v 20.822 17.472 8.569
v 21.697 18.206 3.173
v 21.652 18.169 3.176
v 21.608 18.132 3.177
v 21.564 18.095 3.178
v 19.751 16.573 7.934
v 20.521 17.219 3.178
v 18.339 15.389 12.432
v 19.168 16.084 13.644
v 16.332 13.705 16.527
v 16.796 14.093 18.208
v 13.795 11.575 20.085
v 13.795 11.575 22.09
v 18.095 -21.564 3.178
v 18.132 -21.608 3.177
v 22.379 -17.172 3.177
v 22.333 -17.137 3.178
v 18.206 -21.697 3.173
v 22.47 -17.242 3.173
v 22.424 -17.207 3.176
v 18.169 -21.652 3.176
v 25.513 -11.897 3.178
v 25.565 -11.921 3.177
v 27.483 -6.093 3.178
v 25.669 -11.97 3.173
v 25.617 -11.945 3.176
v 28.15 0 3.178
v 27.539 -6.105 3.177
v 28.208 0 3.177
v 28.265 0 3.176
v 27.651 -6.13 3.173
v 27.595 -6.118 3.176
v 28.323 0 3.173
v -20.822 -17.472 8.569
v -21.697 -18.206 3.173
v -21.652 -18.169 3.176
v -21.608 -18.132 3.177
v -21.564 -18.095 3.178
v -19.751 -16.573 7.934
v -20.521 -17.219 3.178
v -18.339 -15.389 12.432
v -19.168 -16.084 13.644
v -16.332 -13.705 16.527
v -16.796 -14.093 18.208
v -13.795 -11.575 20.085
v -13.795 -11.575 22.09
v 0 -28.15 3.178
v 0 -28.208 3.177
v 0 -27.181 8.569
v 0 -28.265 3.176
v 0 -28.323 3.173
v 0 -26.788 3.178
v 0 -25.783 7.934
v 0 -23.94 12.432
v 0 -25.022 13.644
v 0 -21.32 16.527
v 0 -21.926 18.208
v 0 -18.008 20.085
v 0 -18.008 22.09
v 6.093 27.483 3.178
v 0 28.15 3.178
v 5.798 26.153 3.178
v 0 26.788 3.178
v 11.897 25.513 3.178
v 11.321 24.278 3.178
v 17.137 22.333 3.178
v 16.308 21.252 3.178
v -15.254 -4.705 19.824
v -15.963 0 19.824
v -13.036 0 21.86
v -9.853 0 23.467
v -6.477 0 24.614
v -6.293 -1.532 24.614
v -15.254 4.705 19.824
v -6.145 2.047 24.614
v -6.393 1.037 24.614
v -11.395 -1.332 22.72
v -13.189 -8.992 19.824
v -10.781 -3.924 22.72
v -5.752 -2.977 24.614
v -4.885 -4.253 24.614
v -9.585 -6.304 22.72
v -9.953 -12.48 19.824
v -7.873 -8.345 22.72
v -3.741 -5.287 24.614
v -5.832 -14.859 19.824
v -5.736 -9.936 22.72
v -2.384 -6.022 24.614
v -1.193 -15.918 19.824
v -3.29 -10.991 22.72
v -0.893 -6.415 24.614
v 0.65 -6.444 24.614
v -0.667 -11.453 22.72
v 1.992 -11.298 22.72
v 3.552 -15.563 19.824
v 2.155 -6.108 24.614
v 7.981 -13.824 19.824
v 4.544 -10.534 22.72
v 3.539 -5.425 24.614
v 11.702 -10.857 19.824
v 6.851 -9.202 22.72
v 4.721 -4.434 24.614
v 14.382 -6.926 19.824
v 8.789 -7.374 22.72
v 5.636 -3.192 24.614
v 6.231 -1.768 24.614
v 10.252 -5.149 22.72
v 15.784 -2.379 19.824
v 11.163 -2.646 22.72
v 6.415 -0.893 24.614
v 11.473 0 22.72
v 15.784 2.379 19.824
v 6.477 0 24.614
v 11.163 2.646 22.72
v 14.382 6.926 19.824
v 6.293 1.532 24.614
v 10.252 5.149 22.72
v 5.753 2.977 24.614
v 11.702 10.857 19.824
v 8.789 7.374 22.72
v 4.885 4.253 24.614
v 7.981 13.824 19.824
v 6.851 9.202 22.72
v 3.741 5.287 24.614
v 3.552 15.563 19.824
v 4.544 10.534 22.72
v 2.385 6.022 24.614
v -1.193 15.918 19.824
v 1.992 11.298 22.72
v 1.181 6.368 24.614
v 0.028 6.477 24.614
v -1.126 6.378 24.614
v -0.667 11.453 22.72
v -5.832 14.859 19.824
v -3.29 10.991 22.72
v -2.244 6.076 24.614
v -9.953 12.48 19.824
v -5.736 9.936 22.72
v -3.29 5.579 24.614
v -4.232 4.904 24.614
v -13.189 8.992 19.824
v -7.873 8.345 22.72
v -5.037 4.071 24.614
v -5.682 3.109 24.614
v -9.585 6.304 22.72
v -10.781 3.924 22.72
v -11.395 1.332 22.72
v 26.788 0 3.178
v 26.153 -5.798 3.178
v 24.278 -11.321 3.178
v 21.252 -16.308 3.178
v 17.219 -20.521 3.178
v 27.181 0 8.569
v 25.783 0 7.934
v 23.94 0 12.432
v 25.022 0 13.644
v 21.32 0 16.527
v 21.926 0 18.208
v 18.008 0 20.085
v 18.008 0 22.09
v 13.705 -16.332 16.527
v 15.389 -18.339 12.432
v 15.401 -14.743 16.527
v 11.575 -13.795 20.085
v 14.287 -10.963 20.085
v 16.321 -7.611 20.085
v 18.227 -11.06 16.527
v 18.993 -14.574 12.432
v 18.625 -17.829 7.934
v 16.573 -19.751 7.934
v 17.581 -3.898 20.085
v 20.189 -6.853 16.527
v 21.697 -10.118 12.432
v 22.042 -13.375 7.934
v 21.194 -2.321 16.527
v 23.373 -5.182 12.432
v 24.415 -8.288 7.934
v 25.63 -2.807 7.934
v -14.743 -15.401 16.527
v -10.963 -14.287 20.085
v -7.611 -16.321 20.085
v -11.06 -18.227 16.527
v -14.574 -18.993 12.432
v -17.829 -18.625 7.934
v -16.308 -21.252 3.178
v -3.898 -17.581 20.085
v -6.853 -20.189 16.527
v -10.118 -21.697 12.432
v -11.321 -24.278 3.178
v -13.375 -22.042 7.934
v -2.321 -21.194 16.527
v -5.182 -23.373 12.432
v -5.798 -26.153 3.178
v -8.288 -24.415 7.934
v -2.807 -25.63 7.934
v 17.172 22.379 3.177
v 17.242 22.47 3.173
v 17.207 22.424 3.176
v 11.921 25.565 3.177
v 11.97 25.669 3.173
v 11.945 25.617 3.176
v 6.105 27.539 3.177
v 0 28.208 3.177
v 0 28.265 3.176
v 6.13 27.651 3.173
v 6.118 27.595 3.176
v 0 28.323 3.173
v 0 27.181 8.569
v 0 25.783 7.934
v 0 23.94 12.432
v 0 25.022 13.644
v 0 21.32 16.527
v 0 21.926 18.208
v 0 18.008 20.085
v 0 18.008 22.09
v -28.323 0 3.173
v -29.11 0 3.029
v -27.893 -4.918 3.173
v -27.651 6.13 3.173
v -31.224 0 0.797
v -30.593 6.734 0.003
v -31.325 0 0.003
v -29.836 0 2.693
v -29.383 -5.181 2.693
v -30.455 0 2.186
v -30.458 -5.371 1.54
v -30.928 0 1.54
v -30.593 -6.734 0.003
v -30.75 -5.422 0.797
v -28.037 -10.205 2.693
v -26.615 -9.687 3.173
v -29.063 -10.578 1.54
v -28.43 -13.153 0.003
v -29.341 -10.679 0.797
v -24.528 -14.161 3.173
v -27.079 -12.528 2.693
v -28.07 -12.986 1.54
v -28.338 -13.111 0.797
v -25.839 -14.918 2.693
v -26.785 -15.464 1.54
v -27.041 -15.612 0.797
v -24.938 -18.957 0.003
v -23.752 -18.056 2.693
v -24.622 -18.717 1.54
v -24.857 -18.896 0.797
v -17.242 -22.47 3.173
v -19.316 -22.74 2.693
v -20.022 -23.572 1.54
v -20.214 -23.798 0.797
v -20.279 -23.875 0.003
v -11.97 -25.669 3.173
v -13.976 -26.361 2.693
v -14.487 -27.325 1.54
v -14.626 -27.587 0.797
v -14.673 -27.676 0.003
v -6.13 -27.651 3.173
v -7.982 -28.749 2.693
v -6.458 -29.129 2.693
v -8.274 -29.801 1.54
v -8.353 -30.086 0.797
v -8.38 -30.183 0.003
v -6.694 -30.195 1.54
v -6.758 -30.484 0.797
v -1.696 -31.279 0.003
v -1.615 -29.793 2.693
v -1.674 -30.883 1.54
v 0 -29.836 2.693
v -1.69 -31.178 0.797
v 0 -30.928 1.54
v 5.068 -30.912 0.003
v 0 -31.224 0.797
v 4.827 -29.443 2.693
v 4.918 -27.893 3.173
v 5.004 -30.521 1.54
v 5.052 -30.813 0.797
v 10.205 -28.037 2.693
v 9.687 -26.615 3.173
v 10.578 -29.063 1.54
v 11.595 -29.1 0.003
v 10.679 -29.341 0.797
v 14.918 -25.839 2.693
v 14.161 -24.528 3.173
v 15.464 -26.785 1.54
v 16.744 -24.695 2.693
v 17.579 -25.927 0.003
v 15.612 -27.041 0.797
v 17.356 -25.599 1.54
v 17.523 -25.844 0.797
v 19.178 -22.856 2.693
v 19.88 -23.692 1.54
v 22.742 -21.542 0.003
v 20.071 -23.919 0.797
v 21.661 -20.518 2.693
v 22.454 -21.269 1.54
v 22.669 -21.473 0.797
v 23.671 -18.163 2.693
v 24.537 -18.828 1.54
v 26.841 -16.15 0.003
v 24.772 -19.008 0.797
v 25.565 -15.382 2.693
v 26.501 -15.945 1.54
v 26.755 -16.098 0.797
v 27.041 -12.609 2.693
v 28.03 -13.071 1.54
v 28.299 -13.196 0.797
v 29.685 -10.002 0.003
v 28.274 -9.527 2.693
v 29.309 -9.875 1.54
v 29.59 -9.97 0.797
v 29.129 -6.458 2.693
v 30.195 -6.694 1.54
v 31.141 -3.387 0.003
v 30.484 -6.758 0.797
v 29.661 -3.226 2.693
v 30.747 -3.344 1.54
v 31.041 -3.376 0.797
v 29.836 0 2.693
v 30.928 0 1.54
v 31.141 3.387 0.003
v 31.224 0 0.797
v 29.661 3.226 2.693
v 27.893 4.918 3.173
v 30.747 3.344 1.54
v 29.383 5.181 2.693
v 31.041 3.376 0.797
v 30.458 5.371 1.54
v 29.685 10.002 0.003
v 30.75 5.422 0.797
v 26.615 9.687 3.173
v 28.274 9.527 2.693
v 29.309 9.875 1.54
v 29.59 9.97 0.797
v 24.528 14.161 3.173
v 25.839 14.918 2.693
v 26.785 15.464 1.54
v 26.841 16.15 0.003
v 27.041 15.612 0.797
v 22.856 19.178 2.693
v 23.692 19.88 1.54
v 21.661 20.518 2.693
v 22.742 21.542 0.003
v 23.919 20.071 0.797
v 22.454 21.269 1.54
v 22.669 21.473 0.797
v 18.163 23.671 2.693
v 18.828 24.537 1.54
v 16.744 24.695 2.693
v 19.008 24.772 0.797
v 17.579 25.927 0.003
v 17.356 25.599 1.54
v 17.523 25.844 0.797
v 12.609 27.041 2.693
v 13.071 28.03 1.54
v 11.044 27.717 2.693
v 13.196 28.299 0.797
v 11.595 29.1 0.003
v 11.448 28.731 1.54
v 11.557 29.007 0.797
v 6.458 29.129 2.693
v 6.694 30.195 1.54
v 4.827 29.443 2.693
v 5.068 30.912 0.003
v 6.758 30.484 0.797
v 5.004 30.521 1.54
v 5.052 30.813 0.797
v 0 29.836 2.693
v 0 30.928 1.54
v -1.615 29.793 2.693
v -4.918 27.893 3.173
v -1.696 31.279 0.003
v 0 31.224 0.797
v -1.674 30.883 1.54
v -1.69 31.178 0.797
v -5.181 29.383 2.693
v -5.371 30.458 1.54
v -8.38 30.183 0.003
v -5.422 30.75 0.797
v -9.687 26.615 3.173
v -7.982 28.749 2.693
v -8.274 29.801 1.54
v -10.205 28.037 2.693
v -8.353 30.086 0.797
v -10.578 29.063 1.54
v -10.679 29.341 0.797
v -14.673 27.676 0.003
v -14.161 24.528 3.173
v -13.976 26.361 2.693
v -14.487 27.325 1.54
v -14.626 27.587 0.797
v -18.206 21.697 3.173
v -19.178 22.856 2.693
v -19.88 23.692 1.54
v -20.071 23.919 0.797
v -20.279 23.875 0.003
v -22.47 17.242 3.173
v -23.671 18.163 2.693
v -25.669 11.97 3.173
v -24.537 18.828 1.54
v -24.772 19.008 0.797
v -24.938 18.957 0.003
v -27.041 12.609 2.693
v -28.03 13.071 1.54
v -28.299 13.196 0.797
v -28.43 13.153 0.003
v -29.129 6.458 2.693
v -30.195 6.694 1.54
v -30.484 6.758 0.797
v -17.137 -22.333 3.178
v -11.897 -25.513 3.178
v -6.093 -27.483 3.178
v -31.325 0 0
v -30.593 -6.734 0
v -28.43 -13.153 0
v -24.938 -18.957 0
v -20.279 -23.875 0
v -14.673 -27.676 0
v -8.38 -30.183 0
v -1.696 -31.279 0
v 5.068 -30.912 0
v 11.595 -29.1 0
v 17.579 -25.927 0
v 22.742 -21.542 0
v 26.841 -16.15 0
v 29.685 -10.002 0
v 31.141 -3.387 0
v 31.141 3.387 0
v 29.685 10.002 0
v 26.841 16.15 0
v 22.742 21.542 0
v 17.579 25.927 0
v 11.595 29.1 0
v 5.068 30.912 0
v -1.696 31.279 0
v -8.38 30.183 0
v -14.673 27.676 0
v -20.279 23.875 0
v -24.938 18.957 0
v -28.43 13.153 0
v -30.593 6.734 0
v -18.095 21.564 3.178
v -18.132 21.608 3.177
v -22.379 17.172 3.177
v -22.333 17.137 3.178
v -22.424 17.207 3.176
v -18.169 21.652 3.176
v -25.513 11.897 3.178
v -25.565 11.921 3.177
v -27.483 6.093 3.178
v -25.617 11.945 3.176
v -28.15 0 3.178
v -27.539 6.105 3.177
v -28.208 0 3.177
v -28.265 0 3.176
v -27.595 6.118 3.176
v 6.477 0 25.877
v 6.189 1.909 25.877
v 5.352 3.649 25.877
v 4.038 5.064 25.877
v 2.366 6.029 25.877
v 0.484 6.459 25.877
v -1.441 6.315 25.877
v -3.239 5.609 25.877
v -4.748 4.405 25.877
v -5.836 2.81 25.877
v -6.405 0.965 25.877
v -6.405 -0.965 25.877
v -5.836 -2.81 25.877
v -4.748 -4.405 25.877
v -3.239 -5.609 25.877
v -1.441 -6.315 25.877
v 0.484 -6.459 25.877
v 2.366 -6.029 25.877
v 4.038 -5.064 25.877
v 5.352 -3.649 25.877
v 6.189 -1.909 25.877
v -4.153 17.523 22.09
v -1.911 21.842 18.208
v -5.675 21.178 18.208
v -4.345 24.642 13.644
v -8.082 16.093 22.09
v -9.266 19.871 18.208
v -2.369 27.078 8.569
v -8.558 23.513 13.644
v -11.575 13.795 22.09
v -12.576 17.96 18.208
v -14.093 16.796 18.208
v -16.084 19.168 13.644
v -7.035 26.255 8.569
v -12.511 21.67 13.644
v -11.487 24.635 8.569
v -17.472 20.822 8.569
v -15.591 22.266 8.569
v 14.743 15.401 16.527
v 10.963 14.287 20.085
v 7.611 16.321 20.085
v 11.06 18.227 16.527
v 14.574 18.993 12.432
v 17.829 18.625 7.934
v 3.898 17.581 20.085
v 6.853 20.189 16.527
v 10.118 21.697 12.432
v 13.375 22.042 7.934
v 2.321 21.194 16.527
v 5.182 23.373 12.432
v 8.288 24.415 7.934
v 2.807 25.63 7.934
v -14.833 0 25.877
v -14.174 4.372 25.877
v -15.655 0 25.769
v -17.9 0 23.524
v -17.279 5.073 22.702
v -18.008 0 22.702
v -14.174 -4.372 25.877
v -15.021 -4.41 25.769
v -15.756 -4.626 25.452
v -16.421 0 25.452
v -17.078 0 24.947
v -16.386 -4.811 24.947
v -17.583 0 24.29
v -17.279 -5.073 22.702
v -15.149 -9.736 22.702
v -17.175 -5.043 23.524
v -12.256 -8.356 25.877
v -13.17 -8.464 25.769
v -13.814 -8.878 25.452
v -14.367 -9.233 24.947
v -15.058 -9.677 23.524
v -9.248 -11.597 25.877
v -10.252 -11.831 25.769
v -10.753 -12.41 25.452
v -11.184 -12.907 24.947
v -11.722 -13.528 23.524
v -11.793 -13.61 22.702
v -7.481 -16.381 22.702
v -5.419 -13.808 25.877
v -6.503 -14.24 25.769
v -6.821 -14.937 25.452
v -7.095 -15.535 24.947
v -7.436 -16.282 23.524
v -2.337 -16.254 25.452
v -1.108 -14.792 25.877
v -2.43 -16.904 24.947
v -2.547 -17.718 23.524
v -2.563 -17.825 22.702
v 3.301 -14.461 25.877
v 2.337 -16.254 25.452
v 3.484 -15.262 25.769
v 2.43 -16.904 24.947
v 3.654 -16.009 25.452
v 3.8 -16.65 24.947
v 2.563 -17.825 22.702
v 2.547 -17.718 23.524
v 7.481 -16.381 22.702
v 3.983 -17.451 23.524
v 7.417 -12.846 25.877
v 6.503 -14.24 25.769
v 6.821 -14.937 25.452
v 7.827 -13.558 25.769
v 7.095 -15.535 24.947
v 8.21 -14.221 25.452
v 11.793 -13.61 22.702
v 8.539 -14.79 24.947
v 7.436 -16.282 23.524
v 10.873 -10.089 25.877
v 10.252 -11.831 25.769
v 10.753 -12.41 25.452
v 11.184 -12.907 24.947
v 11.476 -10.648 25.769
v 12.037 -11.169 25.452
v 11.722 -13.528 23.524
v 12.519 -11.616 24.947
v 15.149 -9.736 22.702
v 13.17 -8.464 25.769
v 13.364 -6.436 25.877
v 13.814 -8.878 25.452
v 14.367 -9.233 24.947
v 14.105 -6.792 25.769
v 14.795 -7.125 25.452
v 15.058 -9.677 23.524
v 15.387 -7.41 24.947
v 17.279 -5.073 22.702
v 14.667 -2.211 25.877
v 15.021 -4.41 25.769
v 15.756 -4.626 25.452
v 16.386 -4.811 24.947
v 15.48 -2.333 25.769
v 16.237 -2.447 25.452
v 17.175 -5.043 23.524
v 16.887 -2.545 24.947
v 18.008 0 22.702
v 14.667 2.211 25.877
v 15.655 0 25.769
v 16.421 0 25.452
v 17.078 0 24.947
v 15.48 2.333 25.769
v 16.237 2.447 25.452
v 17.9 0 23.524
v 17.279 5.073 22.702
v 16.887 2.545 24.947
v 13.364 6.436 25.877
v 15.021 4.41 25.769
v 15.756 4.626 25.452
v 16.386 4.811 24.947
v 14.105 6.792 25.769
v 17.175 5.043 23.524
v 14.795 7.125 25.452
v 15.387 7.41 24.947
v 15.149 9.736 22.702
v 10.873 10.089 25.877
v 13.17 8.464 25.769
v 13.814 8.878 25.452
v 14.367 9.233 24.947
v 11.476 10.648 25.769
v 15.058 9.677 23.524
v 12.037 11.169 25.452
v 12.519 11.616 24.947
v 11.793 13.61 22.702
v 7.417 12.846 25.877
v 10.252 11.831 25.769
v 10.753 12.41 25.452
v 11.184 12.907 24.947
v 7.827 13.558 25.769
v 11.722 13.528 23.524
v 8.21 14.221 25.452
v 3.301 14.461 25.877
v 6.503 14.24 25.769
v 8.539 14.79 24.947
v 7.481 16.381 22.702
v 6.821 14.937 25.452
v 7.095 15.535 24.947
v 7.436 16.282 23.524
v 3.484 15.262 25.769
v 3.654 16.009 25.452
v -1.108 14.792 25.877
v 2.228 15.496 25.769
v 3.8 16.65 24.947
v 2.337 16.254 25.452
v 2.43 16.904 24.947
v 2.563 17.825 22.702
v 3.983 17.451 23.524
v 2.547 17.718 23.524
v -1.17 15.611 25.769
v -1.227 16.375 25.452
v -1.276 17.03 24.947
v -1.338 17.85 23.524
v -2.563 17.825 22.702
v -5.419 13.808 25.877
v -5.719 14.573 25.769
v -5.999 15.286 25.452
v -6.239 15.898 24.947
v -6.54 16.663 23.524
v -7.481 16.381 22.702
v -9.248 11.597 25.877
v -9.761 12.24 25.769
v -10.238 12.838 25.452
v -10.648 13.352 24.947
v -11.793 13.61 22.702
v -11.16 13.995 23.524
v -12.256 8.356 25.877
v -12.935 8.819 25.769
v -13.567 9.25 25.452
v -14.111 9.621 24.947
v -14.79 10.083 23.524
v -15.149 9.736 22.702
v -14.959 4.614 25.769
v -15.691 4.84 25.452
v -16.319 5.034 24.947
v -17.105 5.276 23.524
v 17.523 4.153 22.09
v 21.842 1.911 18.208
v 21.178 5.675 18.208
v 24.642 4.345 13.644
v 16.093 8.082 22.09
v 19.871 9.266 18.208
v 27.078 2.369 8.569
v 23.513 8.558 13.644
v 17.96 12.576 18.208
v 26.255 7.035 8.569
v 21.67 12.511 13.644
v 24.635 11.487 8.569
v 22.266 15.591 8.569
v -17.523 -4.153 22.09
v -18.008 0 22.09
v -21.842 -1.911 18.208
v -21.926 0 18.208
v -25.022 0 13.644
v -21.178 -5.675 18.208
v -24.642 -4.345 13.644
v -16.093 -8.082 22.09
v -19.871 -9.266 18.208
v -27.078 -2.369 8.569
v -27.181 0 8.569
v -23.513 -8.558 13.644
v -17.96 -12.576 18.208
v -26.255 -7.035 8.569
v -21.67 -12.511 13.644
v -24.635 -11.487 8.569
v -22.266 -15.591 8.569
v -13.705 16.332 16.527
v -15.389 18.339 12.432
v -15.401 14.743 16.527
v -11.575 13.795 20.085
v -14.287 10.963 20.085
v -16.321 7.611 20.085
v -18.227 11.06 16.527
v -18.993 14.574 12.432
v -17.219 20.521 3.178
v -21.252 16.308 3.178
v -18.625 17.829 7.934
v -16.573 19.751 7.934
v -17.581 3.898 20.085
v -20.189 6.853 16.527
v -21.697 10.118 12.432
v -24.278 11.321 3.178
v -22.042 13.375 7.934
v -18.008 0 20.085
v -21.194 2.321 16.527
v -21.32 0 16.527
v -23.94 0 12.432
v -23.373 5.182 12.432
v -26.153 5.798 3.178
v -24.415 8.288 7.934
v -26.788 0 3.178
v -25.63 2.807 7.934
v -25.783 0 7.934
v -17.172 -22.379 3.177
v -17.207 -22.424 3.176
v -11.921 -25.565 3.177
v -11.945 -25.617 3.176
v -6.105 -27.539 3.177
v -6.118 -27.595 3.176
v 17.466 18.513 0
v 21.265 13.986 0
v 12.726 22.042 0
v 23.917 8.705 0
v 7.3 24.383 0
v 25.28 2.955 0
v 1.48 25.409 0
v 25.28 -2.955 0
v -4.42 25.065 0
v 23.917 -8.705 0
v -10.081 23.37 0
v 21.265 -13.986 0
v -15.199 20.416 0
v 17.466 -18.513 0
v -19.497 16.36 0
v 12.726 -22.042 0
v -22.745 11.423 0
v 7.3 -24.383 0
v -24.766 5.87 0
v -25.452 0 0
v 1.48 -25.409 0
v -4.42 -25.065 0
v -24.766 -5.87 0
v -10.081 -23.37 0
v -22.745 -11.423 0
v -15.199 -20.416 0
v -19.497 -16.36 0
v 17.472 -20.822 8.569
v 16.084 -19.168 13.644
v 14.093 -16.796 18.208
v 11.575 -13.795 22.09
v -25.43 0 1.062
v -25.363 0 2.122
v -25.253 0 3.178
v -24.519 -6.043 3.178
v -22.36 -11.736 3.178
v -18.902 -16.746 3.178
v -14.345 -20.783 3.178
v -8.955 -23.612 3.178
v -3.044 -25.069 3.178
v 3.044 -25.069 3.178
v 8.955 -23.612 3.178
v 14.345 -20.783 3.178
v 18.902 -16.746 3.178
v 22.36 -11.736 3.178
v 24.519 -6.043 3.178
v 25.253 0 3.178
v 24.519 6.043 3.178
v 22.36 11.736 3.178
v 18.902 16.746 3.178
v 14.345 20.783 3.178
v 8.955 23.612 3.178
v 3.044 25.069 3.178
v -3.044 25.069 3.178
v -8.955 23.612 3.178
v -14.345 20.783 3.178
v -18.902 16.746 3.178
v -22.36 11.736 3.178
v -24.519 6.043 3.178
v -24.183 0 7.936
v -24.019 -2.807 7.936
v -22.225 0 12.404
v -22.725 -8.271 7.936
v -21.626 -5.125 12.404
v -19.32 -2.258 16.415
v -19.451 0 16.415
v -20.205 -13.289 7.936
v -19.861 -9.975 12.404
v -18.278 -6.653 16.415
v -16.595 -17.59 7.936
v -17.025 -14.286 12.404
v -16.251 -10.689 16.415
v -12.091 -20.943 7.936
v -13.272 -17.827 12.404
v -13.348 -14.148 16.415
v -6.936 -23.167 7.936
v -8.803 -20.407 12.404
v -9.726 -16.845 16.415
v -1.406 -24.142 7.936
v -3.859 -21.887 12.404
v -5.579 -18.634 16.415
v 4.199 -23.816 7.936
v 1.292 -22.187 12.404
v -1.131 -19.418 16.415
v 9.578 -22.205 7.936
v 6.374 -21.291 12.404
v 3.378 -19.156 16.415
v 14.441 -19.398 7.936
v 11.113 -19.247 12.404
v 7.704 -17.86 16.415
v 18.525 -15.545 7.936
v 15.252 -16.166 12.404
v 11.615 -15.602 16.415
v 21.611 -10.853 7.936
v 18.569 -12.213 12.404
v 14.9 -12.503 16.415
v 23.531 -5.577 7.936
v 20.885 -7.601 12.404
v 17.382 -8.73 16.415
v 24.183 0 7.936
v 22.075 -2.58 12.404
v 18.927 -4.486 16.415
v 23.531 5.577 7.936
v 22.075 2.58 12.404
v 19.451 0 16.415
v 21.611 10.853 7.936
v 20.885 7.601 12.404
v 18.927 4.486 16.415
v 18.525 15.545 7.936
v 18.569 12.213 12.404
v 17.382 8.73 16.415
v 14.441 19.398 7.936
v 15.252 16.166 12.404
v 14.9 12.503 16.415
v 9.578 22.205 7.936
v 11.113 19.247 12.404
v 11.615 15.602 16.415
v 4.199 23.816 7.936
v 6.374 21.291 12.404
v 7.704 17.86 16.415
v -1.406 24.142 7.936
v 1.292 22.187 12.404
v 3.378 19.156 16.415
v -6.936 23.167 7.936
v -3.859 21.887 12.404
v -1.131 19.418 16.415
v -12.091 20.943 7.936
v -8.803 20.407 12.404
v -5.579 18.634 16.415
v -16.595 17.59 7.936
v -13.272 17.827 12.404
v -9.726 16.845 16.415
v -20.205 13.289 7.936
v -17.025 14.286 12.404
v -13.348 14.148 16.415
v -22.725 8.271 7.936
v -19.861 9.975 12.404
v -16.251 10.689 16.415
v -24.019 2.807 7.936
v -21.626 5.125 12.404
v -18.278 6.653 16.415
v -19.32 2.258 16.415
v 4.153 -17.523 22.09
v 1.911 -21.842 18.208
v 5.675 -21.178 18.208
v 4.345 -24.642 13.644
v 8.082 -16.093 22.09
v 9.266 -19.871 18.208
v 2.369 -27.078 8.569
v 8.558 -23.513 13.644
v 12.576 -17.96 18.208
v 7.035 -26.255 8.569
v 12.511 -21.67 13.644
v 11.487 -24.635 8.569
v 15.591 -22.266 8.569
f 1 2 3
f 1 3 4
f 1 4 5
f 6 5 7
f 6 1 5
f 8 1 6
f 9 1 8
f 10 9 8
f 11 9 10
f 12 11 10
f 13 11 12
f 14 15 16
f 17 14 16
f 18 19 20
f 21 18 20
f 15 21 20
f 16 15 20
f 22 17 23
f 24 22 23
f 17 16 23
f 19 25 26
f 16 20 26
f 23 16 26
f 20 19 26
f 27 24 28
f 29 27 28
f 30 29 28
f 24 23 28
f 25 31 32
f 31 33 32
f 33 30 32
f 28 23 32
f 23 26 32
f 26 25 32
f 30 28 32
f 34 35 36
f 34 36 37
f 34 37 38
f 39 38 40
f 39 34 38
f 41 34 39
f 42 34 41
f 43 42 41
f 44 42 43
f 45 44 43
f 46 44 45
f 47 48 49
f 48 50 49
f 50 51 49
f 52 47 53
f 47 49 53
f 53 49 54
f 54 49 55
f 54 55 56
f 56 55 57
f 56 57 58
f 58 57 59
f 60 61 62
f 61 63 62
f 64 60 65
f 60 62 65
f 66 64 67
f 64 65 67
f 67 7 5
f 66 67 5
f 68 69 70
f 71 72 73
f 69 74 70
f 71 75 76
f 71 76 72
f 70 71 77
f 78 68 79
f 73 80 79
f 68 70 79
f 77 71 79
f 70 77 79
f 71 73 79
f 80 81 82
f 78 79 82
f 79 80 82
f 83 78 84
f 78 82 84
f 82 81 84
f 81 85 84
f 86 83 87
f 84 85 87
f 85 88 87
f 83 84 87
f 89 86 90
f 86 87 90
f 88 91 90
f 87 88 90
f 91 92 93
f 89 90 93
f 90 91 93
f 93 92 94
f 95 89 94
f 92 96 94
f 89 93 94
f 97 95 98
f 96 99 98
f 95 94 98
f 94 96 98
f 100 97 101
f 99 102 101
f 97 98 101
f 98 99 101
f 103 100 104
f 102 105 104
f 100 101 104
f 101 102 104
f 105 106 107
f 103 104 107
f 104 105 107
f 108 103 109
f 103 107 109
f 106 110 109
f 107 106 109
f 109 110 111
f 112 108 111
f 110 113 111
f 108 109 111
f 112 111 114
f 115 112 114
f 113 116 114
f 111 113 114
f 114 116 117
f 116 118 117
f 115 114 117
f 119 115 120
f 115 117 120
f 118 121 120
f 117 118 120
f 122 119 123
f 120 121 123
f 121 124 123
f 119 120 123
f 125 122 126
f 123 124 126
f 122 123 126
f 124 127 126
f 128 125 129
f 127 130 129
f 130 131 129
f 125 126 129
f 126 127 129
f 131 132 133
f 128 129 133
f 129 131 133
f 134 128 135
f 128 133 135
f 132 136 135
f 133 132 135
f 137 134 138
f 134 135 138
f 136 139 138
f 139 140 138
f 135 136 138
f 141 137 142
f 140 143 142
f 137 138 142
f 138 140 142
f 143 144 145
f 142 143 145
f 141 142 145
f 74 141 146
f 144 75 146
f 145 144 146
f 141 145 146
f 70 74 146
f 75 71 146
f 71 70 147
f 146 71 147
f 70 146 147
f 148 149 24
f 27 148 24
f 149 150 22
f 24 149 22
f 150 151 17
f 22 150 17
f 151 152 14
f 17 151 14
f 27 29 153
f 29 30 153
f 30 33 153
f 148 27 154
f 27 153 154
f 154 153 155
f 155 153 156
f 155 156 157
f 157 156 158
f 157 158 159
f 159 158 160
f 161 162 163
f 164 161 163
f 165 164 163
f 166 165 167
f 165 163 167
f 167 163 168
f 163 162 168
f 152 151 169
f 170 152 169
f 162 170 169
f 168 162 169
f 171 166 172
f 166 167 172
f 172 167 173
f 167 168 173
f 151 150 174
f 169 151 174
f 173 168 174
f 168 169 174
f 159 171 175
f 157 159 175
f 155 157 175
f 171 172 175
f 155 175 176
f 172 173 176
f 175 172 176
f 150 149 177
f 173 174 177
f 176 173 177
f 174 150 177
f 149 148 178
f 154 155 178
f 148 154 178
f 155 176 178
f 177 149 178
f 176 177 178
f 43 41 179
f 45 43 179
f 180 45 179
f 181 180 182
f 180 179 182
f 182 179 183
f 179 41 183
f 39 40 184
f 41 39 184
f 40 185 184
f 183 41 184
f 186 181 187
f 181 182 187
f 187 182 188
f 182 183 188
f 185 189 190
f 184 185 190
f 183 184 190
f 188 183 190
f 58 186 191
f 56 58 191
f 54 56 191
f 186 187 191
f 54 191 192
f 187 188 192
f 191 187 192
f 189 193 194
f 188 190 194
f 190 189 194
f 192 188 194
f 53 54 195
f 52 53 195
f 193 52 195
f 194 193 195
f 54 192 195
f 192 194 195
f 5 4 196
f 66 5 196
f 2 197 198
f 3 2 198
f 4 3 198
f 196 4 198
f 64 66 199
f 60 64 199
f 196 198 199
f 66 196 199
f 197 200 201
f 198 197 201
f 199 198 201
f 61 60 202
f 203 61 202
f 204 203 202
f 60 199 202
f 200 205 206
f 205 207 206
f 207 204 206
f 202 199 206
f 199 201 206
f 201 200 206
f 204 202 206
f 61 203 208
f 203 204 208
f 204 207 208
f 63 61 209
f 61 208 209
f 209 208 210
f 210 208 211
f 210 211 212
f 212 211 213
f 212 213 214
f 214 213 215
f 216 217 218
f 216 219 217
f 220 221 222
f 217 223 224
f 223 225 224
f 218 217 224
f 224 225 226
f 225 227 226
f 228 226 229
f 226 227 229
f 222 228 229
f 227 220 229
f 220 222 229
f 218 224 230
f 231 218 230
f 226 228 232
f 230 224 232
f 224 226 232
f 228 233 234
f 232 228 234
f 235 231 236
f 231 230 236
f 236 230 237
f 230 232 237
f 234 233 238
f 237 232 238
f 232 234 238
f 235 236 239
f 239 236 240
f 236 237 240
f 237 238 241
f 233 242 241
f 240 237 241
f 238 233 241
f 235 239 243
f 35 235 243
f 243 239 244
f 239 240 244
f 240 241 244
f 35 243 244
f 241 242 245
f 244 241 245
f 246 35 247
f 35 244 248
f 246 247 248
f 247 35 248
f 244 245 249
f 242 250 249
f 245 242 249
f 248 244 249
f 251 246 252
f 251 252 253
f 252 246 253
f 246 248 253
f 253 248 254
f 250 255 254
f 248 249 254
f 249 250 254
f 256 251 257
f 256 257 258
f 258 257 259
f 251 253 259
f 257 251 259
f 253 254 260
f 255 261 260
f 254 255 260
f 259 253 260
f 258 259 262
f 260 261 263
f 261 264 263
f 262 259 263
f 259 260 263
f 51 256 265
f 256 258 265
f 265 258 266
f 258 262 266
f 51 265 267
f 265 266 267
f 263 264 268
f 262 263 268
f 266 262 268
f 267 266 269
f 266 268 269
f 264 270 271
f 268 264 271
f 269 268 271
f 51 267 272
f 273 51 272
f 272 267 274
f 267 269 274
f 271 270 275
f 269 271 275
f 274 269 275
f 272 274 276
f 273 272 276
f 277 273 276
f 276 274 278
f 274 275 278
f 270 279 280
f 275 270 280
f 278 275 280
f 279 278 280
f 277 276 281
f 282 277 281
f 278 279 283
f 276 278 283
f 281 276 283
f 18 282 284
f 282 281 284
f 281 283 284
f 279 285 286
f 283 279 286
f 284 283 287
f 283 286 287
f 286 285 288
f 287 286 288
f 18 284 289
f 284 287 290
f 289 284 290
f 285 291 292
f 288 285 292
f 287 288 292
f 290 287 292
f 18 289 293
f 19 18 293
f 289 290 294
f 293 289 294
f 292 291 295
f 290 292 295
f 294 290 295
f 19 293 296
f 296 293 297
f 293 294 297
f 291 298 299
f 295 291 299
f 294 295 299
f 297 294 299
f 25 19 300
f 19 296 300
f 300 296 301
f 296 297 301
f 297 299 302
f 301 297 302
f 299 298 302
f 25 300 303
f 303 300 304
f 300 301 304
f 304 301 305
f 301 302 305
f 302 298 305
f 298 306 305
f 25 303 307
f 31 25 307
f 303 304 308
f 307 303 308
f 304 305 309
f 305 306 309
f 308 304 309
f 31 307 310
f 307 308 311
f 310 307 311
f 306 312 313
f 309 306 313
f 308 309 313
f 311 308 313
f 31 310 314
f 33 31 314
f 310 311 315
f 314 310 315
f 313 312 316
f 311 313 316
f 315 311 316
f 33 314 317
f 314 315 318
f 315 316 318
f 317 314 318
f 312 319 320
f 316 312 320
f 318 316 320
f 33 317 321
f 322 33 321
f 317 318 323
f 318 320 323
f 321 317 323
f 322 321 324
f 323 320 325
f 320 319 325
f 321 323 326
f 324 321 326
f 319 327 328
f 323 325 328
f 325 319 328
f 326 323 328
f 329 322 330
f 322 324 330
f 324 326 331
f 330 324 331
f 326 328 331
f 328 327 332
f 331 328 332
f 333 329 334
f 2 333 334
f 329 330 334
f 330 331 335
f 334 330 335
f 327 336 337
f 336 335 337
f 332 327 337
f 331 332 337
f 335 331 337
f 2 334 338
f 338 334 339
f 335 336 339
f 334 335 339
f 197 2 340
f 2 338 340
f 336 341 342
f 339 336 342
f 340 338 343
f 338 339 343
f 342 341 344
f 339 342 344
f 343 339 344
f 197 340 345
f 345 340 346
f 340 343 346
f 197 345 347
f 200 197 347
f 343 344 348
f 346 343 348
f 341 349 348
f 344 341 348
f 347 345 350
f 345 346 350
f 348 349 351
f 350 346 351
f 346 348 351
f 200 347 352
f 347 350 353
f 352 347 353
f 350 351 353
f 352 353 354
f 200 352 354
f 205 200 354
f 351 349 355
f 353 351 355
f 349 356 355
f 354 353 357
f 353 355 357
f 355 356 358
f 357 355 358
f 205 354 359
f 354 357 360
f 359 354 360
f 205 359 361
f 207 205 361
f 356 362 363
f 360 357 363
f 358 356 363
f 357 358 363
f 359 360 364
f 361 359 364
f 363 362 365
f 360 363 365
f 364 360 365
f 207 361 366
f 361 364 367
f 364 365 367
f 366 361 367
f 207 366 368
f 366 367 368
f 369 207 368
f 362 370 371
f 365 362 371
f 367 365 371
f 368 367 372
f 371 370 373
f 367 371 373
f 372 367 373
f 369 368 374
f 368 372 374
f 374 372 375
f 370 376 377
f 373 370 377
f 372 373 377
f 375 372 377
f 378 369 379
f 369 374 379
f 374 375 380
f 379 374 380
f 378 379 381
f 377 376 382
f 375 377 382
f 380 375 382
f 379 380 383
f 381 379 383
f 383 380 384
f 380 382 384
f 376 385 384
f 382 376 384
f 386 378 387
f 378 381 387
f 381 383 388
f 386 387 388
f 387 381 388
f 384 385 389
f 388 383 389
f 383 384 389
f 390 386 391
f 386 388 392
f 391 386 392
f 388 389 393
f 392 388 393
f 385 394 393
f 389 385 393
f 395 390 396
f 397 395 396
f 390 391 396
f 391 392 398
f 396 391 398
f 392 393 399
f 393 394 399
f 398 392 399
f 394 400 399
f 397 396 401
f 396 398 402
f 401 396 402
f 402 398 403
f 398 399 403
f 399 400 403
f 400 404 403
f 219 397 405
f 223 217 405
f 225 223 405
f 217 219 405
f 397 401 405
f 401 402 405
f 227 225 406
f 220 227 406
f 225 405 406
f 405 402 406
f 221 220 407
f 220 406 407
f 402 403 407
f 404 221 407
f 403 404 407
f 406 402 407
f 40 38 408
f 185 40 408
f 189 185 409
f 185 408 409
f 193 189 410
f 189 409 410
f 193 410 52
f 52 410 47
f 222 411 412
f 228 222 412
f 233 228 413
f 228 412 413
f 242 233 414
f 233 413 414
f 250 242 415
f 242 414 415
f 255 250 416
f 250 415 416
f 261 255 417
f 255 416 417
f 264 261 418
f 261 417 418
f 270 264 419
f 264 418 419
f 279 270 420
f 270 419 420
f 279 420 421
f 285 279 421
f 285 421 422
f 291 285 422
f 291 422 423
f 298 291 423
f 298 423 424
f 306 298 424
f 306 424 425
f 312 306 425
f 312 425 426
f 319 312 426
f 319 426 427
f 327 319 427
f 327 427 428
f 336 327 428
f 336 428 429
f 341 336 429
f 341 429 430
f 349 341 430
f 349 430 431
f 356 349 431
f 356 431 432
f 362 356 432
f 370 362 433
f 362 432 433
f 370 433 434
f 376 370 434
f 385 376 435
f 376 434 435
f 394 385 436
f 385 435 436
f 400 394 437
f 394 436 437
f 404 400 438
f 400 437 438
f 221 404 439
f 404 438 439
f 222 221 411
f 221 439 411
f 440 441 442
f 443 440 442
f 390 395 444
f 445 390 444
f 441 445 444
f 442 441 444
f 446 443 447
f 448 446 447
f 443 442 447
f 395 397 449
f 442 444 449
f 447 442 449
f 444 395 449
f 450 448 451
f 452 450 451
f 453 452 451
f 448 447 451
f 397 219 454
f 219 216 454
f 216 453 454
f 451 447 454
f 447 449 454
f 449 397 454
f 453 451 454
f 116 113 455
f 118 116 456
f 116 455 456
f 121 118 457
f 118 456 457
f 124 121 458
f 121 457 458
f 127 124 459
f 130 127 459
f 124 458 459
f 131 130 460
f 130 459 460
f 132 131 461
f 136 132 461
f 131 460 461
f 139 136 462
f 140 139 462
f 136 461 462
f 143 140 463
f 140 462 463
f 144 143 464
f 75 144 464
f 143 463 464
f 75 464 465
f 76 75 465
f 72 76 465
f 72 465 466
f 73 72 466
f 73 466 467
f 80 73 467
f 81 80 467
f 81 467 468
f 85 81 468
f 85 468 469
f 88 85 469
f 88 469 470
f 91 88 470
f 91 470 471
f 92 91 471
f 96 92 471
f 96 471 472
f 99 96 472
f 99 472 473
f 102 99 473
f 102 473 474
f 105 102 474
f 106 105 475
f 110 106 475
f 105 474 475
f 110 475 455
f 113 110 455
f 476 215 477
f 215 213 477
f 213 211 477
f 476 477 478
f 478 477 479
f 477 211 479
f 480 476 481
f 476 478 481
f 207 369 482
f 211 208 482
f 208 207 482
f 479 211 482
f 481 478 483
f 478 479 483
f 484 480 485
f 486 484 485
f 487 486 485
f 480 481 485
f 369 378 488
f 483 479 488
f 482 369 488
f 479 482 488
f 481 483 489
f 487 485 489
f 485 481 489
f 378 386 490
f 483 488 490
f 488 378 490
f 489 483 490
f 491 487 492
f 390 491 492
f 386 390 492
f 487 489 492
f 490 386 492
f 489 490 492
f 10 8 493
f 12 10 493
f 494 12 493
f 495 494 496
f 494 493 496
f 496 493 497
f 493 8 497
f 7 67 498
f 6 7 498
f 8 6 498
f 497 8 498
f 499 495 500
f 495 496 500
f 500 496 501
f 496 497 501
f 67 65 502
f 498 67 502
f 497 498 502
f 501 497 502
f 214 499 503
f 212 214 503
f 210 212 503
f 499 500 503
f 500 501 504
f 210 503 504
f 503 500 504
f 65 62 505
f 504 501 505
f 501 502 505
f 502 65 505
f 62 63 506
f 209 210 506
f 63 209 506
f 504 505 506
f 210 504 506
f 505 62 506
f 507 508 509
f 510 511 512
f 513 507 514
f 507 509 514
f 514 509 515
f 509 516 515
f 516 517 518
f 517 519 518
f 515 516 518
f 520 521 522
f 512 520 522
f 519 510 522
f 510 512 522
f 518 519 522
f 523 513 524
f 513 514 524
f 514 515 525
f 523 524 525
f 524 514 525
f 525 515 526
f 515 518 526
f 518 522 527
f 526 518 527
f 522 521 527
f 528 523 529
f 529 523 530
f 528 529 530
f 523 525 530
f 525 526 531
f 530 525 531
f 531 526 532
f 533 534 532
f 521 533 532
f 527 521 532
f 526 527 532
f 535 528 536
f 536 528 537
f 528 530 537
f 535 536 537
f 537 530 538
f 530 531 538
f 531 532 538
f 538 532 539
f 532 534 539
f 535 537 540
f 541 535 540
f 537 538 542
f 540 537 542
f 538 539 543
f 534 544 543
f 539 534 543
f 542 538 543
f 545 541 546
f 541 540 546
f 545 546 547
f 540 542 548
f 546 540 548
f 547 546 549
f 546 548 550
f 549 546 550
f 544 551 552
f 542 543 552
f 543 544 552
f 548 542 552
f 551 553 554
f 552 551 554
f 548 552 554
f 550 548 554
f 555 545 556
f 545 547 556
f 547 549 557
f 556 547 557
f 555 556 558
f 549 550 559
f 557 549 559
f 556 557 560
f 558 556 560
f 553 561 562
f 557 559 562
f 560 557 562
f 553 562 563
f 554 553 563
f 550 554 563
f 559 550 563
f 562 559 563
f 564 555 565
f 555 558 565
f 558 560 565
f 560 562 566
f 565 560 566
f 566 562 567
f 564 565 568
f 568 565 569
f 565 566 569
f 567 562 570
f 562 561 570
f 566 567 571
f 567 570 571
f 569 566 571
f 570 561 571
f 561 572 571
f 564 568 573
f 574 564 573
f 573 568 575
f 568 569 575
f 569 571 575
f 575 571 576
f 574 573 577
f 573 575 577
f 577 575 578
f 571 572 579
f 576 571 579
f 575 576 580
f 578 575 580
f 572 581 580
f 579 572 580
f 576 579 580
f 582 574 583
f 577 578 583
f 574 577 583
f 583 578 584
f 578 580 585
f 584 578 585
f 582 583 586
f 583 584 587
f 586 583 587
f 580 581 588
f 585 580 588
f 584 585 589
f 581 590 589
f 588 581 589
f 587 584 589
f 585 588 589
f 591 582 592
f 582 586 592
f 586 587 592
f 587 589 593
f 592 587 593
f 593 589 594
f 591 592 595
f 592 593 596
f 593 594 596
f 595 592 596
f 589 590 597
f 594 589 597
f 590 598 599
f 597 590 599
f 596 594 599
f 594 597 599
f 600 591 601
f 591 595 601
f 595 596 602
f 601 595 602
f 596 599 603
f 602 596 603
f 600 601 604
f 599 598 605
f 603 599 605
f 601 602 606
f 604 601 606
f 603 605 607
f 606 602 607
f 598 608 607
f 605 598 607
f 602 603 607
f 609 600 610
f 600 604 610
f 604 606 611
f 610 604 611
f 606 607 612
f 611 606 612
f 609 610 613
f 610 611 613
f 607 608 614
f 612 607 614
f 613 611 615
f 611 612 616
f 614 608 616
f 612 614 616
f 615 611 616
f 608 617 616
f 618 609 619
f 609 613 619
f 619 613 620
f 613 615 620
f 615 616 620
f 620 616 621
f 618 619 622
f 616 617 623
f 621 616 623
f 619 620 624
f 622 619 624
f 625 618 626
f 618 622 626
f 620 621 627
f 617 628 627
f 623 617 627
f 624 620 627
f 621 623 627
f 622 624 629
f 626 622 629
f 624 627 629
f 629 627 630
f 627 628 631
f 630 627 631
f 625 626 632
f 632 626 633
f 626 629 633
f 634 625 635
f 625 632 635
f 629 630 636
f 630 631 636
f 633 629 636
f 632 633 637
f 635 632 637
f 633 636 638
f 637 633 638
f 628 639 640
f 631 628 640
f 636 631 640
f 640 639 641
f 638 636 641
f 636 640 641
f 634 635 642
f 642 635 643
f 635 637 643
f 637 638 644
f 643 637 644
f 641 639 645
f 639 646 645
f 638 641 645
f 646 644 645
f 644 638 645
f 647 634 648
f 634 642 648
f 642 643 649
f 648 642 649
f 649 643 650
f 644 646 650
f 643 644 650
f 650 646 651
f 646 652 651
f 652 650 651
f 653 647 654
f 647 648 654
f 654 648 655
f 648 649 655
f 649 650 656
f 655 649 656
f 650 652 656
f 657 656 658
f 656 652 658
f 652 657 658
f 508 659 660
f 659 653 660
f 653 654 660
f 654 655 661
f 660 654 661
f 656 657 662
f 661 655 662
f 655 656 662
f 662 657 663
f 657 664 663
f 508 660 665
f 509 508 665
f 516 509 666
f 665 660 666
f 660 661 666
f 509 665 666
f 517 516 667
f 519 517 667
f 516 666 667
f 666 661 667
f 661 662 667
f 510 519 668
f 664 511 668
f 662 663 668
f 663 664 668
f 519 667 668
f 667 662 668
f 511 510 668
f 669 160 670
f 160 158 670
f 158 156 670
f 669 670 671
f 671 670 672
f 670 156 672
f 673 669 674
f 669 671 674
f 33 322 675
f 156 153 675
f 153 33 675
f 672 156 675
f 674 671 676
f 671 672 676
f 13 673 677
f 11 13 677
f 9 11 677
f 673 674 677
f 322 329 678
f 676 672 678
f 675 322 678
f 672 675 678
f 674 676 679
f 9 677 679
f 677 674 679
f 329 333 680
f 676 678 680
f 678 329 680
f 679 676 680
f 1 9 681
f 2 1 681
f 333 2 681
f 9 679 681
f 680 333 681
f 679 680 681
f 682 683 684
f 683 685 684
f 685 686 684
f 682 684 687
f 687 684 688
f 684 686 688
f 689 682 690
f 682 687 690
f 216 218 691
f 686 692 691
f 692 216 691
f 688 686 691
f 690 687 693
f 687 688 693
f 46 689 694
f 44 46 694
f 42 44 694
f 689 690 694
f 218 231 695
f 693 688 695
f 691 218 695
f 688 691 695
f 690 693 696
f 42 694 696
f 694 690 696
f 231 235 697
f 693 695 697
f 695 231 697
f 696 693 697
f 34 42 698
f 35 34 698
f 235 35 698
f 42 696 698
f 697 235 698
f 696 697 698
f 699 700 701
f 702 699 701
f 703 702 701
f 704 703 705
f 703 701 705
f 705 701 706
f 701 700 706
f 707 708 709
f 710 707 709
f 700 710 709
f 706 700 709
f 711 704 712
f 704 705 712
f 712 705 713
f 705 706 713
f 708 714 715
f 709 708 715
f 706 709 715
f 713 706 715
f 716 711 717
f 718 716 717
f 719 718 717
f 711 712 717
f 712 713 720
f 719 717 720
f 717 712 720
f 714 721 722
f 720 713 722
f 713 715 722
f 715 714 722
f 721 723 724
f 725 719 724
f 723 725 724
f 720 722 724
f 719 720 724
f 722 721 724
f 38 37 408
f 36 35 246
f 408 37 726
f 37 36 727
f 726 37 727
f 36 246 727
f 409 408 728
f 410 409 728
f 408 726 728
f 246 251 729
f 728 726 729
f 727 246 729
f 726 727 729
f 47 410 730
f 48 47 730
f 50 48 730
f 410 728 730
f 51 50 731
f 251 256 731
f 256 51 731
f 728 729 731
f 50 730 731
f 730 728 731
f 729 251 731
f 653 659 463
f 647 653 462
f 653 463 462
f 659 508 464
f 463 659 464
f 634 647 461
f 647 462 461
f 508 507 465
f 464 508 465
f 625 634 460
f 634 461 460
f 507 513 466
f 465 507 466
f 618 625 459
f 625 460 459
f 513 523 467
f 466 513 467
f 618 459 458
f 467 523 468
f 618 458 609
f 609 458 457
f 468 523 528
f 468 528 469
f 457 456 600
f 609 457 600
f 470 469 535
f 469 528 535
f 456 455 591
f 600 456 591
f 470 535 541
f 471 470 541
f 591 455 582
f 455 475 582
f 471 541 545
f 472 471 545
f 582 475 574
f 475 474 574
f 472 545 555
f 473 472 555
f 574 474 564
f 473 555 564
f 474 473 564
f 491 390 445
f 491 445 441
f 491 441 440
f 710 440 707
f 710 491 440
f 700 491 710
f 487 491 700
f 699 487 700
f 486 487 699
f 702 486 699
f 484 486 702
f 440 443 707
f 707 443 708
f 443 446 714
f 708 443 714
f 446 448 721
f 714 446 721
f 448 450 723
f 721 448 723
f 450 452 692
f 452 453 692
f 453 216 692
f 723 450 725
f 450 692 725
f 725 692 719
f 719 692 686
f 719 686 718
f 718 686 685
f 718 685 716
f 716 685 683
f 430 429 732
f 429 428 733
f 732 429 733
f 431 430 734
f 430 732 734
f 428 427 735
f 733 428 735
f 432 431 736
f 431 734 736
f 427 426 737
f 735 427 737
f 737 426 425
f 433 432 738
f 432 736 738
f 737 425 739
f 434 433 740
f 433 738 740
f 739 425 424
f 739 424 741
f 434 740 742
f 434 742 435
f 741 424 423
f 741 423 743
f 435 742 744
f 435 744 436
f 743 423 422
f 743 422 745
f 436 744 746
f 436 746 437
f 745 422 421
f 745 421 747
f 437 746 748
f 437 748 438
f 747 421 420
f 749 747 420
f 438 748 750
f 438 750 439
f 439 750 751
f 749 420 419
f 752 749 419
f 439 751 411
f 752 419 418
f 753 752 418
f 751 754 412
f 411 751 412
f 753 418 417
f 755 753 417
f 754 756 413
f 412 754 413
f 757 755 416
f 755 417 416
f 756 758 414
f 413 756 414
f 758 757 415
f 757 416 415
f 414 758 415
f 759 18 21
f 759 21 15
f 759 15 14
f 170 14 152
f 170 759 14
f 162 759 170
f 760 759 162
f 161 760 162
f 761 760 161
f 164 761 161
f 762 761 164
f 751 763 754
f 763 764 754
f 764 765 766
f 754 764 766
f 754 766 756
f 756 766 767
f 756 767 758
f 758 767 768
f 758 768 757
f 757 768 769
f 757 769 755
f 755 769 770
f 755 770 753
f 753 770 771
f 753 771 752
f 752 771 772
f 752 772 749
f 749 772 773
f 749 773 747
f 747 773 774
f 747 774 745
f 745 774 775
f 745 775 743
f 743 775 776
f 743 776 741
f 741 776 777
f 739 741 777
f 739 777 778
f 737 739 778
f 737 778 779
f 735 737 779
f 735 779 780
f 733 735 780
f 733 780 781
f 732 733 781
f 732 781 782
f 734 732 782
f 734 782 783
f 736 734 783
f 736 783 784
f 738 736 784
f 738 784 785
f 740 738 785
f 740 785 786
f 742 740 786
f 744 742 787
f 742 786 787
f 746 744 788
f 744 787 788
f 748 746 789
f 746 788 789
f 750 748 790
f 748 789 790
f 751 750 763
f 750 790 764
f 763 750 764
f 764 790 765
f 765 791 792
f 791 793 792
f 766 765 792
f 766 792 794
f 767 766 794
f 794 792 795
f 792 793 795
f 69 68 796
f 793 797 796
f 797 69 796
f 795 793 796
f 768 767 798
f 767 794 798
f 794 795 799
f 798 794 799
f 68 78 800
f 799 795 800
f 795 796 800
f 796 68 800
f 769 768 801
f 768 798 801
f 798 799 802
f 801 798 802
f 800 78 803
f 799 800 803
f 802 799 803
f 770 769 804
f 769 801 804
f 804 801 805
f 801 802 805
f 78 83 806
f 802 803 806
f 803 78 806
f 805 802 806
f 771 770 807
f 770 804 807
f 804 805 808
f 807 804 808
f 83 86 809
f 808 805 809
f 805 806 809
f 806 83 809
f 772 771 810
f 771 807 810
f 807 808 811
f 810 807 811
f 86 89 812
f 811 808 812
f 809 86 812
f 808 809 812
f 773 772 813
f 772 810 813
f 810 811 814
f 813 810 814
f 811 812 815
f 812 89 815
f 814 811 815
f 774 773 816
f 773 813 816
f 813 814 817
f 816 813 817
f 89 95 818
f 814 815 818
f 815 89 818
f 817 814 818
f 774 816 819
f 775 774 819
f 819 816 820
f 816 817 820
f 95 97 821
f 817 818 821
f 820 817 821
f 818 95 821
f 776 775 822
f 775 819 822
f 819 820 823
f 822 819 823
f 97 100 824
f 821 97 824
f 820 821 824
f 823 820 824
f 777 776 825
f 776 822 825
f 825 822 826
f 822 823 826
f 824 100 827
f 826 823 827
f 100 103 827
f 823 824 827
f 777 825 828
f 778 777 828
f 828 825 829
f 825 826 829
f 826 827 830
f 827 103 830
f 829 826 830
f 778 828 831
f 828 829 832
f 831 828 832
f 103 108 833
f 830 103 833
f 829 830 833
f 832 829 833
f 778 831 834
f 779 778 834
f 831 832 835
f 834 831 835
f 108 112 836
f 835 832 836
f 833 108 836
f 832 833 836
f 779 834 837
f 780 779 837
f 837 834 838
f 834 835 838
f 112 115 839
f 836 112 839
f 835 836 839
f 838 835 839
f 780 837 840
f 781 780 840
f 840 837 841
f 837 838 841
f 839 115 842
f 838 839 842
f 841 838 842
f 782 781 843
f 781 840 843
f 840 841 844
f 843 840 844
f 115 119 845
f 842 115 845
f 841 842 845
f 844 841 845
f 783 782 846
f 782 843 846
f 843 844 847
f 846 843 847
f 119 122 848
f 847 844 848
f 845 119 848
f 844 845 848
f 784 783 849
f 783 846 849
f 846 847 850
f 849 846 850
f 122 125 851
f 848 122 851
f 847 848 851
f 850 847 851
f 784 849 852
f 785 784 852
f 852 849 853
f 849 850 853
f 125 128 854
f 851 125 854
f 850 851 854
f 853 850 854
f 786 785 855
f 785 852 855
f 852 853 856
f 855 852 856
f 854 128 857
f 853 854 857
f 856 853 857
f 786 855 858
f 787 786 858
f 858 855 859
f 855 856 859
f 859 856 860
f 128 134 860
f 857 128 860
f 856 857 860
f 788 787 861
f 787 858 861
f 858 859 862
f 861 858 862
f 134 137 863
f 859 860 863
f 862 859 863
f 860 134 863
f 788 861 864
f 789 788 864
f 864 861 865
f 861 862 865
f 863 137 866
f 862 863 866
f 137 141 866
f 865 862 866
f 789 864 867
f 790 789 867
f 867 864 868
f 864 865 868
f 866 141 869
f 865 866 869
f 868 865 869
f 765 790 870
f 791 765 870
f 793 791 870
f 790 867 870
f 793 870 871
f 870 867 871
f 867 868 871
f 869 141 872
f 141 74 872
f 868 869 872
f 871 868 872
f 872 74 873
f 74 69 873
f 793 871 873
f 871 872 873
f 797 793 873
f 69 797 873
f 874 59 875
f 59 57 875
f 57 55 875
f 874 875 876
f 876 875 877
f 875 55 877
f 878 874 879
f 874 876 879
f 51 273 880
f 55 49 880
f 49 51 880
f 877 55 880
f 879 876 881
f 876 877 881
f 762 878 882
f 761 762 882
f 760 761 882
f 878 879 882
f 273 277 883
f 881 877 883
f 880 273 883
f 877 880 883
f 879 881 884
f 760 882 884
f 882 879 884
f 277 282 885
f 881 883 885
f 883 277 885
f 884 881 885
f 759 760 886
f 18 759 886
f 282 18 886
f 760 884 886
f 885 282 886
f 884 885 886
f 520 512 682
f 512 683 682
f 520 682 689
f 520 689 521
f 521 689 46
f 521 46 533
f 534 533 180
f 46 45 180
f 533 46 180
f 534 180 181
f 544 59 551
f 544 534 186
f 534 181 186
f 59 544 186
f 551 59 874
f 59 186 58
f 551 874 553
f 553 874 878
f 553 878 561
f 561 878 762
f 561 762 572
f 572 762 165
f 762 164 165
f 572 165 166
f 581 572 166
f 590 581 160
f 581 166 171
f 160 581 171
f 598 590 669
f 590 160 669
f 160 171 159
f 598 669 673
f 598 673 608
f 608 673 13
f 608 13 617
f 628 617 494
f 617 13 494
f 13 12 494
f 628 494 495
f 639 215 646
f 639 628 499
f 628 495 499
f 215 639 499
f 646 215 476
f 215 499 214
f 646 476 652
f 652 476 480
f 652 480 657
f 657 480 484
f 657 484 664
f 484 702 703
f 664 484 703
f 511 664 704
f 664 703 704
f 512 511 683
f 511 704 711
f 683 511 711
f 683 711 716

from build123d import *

# Parameters (mm, degrees)
F2_ANGLE = 40
F3_COUNT = 4
F4_R     = 6.477
F5_DEPTH = 25.4


with BuildPart() as f1:
    # F0 (on Front) → F1 (revolve)
    with BuildSketch(Plane.XZ):
        with BuildLine():
            Line((0, 25.452), (0, 25.8772801608))
            Line((0, 25.8772801608), (-7.6204296126, 25.8772801608))
            ThreePointArc((-7.6204296126, 25.8772801608), (-13.1374862604, 23.5607943575), (-18.0081613362, 20.0850865393))
            Line((-18.0081613362, 20.0850865393), (-18.0081613362, 19.8241155595))
            Line((-18.0081613362, 19.8241155595), (-15.9627299133, 19.8241155595))
            ThreePointArc((-15.9627299133, 19.8241155595), (-8.46288706, 24.0038298321), (0, 25.452))
        make_face()
        with BuildLine():
            Line((-7.6204296126, 25.8772801608), (-11.9422096565, 25.8772801608))
            ThreePointArc((-11.9422096565, 25.8772801608), (-15.0944548323, 24.1745203327), (-18.0081613362, 22.0897289547))
            Line((-18.0081613362, 22.0897289547), (-18.0081613362, 20.0850865393))
            ThreePointArc((-18.0081613362, 20.0850865393), (-13.1374862604, 23.5607943575), (-7.6204296126, 25.8772801608))
        make_face()
        with BuildLine():
            ThreePointArc((-18.0081613362, 22.0897289547), (-15.0944548323, 24.1745203327), (-11.9422096565, 25.8772801608))
            Line((-11.9422096565, 25.8772801608), (-14.8331613362, 25.8772801608))
            ThreePointArc((-14.8331613362, 25.8772801608), (-17.0782253665, 24.9473441911), (-18.0081613362, 22.7022801608))
            Line((-18.0081613362, 22.7022801608), (-18.0081613362, 22.0897289547))
        make_face()
        with BuildLine():
            ThreePointArc((-18.0081613362, 20.0850865393), (-23.9403569629, 12.4323724401), (-26.7881585713, 3.1779138371))
            Line((-26.7881585713, 3.1779138371), (-25.2528249438, 3.1779138371))
            ThreePointArc((-25.2528249438, 3.1779138371), (-22.2250871425, 12.4036206613), (-15.9627299133, 19.8241155595))
            Line((-15.9627299133, 19.8241155595), (-18.0081613362, 19.8241155595))
            Line((-18.0081613362, 19.8241155595), (-18.0081613362, 20.0850865393))
        make_face()
        with BuildLine():
            ThreePointArc((-26.7881585713, 3.1779138371), (-26.9289986968, 1.5917302503), (-26.976, 0))
            Line((-26.976, 0), (-25.452, 0))
            ThreePointArc((-25.452, 0), (-25.4021574327, 1.5920746731), (-25.2528249438, 3.1779138371))
            Line((-25.2528249438, 3.1779138371), (-26.7881585713, 3.1779138371))
        make_face()
        with BuildLine():
            ThreePointArc((-28.3227948385, 3.1732148584), (-28.4556642243, 1.5890794668), (-28.5, 0))
            Line((-28.5, 0), (-26.976, 0))
            ThreePointArc((-26.976, 0), (-26.9289986968, 1.5917302503), (-26.7881585713, 3.1779138371))
            Line((-26.7881585713, 3.1779138371), (-28.1501204789, 3.1779138371))
            ThreePointArc((-28.1501204789, 3.1779138371), (-28.236489621, 3.176738875), (-28.3227948385, 3.1732148584))
        make_face()
        with BuildLine():
            Line((-31.3251204789, 0), (-28.5, 0))
            ThreePointArc((-28.5, 0), (-28.4556642243, 1.5890794668), (-28.3227948385, 3.1732148584))
            ThreePointArc((-28.3227948385, 3.1732148584), (-30.4554258916, 2.1860748376), (-31.3251204789, 0.0029138371))
            Line((-31.3251204789, 0.0029138371), (-31.3251204789, 0))
        make_face()
    revolve(axis=Axis((0, 0, 14.25), (0, 0, 1)))

    # F0 (on Front) → F2 (revolve)
    with BuildSketch(Plane.XZ):
        with BuildLine():
            ThreePointArc((-18.0081613362, 22.0897289547), (-25.0219503917, 13.6437530979), (-28.3227948385, 3.1732148584))
            ThreePointArc((-28.3227948385, 3.1732148584), (-28.236489621, 3.176738875), (-28.1501204789, 3.1779138371))
            Line((-28.1501204789, 3.1779138371), (-26.7881585713, 3.1779138371))
            ThreePointArc((-26.7881585713, 3.1779138371), (-23.9403569629, 12.4323724401), (-18.0081613362, 20.0850865393))
            Line((-18.0081613362, 20.0850865393), (-18.0081613362, 22.0897289547))
        make_face()
    revolve(axis=Axis((0, 0, 14.25), (0, 0, 1)), revolution_arc=F2_ANGLE)

    # F3: F1 ×4 about axis
    f3_axis = Axis((0, 0, 14.25), (0, 0, 1))


with BuildPart() as f1_1:
    add(f1.part)
    for i in range(1, F3_COUNT):
        add(f1.part.rotate(f3_axis, i * 360 / F3_COUNT))

    # F4 (on face) → F5 (cut)
    with BuildSketch(Plane.XY.offset(25.8772801608)):
        Circle(F4_R)
    extrude(amount=-F5_DEPTH, mode=Mode.SUBTRACT)


solid = f1_1.part
